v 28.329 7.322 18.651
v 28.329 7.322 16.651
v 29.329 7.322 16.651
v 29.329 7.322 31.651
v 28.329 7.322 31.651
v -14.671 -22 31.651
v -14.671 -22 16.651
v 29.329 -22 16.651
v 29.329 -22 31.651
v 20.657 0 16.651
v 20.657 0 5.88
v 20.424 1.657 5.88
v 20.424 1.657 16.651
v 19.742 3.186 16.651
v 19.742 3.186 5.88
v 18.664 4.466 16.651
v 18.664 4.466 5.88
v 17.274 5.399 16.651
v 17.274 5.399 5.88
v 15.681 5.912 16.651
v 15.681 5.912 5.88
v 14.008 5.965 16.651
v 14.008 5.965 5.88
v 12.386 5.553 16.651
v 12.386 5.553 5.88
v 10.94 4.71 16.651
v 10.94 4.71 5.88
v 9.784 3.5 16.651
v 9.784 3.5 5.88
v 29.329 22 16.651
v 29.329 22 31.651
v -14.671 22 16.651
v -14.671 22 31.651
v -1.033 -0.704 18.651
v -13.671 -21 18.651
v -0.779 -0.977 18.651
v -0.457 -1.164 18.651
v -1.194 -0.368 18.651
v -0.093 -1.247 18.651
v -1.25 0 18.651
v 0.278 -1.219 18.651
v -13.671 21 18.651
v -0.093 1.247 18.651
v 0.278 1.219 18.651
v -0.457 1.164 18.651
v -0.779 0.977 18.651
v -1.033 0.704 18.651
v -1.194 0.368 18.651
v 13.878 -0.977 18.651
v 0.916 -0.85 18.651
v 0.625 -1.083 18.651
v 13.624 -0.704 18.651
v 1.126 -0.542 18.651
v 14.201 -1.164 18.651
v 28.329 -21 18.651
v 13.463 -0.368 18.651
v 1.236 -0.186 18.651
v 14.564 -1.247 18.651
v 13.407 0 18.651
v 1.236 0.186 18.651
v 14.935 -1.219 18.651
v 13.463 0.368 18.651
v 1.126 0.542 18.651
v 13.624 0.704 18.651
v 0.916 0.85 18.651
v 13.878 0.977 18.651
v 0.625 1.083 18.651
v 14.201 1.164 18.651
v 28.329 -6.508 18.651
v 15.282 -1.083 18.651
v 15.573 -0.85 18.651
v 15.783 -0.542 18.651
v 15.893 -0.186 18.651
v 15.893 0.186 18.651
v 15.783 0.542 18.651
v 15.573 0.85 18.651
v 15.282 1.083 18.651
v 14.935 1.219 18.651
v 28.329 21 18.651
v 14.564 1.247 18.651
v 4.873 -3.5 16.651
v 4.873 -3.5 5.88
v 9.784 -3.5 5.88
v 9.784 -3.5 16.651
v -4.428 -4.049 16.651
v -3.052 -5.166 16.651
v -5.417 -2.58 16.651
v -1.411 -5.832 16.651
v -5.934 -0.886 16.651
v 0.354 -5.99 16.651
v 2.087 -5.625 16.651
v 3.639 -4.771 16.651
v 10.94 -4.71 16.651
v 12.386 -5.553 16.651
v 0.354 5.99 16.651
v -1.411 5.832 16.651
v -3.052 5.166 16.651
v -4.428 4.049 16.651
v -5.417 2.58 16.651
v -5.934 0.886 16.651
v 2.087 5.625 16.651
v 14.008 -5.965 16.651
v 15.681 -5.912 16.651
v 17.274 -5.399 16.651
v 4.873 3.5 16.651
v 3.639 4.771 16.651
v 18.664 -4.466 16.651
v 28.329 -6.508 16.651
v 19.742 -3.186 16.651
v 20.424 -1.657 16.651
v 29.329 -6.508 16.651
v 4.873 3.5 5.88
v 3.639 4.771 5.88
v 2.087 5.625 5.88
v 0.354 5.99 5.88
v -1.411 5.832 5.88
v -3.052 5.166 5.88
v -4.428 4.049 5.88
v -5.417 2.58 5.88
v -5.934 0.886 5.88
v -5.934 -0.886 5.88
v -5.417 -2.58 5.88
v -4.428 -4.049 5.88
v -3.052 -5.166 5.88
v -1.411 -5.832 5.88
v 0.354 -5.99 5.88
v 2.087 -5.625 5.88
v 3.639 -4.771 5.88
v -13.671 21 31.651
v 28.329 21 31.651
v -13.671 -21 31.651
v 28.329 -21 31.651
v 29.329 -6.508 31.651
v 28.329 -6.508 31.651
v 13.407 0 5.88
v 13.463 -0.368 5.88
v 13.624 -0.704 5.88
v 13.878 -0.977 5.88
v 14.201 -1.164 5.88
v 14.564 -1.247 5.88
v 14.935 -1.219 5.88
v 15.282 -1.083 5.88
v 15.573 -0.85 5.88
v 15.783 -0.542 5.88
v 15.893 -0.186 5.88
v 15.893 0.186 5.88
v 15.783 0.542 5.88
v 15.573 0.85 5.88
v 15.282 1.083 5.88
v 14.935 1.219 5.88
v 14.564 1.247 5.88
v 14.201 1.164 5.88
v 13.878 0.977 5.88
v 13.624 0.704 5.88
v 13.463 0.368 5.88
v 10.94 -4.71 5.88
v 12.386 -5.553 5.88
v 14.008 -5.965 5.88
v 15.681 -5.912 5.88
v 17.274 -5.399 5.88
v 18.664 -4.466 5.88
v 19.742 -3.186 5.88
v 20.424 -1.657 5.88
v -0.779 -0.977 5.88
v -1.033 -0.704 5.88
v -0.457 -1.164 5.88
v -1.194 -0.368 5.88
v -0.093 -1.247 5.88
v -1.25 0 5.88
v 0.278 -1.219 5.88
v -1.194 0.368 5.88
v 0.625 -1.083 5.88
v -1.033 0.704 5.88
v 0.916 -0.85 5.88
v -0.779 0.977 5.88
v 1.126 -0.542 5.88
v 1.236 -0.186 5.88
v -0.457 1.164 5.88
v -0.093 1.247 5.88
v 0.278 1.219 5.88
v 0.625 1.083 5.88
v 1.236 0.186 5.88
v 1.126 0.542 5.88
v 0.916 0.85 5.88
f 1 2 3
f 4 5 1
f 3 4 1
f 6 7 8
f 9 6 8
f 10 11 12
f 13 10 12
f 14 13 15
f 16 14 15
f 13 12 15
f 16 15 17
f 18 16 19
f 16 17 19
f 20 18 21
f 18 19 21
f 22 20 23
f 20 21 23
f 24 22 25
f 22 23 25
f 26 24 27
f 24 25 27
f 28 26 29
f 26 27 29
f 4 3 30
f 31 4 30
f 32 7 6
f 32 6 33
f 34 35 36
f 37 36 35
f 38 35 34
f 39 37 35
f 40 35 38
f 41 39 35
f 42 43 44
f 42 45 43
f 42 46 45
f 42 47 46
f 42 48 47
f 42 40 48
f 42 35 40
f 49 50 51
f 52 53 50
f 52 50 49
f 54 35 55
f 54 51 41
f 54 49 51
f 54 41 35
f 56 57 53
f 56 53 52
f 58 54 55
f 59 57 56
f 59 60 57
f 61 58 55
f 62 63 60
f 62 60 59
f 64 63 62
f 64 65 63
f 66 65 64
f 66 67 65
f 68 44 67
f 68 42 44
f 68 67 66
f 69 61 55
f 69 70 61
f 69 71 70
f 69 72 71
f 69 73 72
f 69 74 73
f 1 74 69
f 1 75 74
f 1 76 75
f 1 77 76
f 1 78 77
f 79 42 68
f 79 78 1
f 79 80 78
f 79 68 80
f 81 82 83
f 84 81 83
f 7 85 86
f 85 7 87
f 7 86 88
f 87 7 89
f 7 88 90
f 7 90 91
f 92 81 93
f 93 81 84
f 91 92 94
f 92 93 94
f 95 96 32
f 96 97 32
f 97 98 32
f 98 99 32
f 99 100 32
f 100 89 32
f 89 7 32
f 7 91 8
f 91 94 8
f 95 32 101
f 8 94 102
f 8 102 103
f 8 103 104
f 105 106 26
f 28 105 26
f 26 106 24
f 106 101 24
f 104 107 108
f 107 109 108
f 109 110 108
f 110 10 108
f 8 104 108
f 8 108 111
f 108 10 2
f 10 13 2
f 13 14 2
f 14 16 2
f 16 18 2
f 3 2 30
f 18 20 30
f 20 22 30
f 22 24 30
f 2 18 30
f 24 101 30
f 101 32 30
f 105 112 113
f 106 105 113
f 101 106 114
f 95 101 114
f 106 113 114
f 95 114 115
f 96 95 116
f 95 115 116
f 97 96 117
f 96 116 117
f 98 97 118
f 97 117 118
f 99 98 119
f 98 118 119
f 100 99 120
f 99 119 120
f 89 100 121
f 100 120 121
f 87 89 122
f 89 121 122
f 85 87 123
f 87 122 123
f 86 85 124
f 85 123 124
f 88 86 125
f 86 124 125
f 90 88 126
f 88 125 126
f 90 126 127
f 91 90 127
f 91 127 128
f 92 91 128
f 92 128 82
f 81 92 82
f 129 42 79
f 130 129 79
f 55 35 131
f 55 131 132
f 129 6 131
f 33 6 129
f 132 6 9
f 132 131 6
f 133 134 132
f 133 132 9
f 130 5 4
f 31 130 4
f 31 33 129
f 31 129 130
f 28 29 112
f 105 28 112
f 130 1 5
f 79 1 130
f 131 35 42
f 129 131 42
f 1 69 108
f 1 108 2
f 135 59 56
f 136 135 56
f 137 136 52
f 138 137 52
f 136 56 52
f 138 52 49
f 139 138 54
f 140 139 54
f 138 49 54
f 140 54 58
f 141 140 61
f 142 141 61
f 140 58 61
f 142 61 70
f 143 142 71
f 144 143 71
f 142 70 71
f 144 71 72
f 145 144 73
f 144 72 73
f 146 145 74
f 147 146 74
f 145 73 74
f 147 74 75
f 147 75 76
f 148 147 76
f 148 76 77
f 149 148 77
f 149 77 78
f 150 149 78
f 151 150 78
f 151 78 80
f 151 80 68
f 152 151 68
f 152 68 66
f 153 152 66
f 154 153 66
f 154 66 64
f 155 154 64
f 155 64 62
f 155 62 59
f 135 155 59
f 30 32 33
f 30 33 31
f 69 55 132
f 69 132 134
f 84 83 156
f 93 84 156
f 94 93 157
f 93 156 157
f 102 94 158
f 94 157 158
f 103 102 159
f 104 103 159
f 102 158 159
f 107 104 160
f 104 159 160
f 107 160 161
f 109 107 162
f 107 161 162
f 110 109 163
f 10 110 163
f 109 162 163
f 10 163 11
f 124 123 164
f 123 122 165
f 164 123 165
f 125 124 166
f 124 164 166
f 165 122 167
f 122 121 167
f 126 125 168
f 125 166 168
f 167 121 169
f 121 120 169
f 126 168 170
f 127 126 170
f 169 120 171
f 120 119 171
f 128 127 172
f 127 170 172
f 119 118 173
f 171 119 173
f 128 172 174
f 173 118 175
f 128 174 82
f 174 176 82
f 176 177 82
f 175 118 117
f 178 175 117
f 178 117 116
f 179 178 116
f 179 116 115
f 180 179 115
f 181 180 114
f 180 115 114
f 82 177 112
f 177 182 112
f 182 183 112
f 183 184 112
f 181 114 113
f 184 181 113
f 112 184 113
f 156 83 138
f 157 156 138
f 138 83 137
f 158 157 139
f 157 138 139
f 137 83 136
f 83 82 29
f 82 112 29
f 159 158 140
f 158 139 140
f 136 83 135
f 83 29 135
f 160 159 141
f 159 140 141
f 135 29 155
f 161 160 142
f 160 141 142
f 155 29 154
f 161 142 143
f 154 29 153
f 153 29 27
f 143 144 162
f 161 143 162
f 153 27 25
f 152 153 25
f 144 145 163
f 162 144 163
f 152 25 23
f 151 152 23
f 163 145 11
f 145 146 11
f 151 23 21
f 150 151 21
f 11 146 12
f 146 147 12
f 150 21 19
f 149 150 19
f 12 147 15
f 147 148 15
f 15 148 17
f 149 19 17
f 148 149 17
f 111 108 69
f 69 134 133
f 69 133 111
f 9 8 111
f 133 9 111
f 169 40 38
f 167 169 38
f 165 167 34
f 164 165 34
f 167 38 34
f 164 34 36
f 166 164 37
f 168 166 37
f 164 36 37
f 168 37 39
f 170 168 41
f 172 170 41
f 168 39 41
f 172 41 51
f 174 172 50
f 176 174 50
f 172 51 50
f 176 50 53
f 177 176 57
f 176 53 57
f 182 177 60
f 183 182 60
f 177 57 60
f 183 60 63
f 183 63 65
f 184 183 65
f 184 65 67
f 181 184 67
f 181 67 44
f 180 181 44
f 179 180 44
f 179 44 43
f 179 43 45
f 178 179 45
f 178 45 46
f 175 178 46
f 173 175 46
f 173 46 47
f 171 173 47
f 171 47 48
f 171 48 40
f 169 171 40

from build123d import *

# Parameters (mm, degrees)
F1_DEPTH = 16.65056
F2_W     = 42
F2_H     = 42
F3_DEPTH = 2
F2_W_2   = 44
F2_H_2   = 44
F4_DEPTH = 15
F6_D     = 2.5
F7_DEPTH = 5.88
F8_W     = 1
F8_H     = 13.8298794627
F9_DEPTH = 25


with BuildPart() as f1:
    # F0 (on Top) → F1 (new body)
    with BuildSketch(Plane.XY):
        with BuildLine():
            Line((0.0728459244, 3.5), (4.8733971724, 3.5))
            ThreePointArc((4.8733971724, 3.5), (-6, 0), (4.8733971724, -3.5))
            Line((4.8733971724, -3.5), (0.0728459244, -3.5))
            Line((0.0728459244, -3.5), (0.0728459244, 3.5))
        make_face()
        with BuildLine():
            ThreePointArc((4.8733971724, 3.5), (5.7114088907, 1.8384255445), (6, 0))
            ThreePointArc((6, 0), (5.7114088907, -1.8384255445), (4.8733971724, -3.5))
            Line((4.8733971724, -3.5), (9.7837838487, -3.5))
            ThreePointArc((9.7837838487, -3.5), (8.6571810211, 0), (9.7837838487, 3.5))
            Line((9.7837838487, 3.5), (4.8733971724, 3.5))
        make_face()
        with BuildLine():
            ThreePointArc((4.8733971724, -3.5), (5.7114088907, -1.8384255445), (6, 0))
            ThreePointArc((6, 0), (5.7114088907, 1.8384255445), (4.8733971724, 3.5))
            Line((4.8733971724, 3.5), (0.0728459244, 3.5))
            Line((0.0728459244, 3.5), (0.0728459244, -3.5))
            Line((0.0728459244, -3.5), (4.8733971724, -3.5))
        make_face()
        with BuildLine():
            Line((14.6571810211, 3.5), (9.7837838487, 3.5))
            ThreePointArc((9.7837838487, 3.5), (8.6571810211, 0), (9.7837838487, -3.5))
            Line((9.7837838487, -3.5), (14.6571810211, -3.5))
            Line((14.6571810211, -3.5), (14.6571810211, 3.5))
        make_face()
        with BuildLine():
            ThreePointArc((20.6571810211, 0), (16.4956065656, 5.7114088907), (9.7837838487, 3.5))
            Line((9.7837838487, 3.5), (14.6571810211, 3.5))
            Line((14.6571810211, 3.5), (14.6571810211, -3.5))
            Line((14.6571810211, -3.5), (9.7837838487, -3.5))
            ThreePointArc((9.7837838487, -3.5), (16.4956065656, -5.7114088907), (20.6571810211, 0))
        make_face()
    extrude(amount=F1_DEPTH)

    # F2 (on face) → F3 (join)
    with BuildSketch(Plane.XY.offset(16.65056)):
        with Locations((7.3285905105, 0)):
            Rectangle(F2_W, F2_H)
        with BuildLine():
            ThreePointArc((4.8733971724, -3.5), (-6, 0), (4.8733971724, 3.5))
            Line((4.8733971724, 3.5), (9.7837838487, 3.5))
            ThreePointArc((9.7837838487, 3.5), (20.6571810211, 0), (9.7837838487, -3.5))
            Line((9.7837838487, -3.5), (4.8733971724, -3.5))
        make_face(mode=Mode.SUBTRACT)
        with BuildLine():
            Line((9.7837838487, 3.5), (4.8733971724, 3.5))
            ThreePointArc((4.8733971724, 3.5), (-6, 0), (4.8733971724, -3.5))
            Line((4.8733971724, -3.5), (9.7837838487, -3.5))
            ThreePointArc((9.7837838487, -3.5), (20.6571810211, 0), (9.7837838487, 3.5))
        make_face()
    extrude(amount=F3_DEPTH)

    # F2 (on face) → F4 (join)
    with BuildSketch(Plane.XY.offset(16.65056)):
        with Locations((7.3285905105, 0)):
            Rectangle(F2_W_2, F2_H_2)
        with Locations((7.3285905105, 0)):
            Rectangle(F2_W, F2_H, mode=Mode.SUBTRACT)
    extrude(amount=F4_DEPTH)

    # F6 (through all)
    with Locations(Plane(origin=(0, 0, 0), x_dir=(1, 0, 0), z_dir=(0, 0, -1))):
        with Locations((0, 0), (14.6571810211, 0)):
            Hole(F6_D / 2)

    # F7 (cut): a face of the model
    f7_faces = [f1.faces().sort_by_distance(p)[0] for p in [
        (7.3285905105, 0, 0),
    ]]
    extrude(f7_faces, amount=-F7_DEPTH, mode=Mode.SUBTRACT)

    # F8 (on face) → F9 (cut)
    with BuildSketch(Plane.XY.offset(31.65056)):
        with Locations((28.8285905105, 0.4071192816)):
            Rectangle(F8_W, F8_H)
    extrude(amount=-F9_DEPTH, mode=Mode.SUBTRACT)


solid = f1.part
